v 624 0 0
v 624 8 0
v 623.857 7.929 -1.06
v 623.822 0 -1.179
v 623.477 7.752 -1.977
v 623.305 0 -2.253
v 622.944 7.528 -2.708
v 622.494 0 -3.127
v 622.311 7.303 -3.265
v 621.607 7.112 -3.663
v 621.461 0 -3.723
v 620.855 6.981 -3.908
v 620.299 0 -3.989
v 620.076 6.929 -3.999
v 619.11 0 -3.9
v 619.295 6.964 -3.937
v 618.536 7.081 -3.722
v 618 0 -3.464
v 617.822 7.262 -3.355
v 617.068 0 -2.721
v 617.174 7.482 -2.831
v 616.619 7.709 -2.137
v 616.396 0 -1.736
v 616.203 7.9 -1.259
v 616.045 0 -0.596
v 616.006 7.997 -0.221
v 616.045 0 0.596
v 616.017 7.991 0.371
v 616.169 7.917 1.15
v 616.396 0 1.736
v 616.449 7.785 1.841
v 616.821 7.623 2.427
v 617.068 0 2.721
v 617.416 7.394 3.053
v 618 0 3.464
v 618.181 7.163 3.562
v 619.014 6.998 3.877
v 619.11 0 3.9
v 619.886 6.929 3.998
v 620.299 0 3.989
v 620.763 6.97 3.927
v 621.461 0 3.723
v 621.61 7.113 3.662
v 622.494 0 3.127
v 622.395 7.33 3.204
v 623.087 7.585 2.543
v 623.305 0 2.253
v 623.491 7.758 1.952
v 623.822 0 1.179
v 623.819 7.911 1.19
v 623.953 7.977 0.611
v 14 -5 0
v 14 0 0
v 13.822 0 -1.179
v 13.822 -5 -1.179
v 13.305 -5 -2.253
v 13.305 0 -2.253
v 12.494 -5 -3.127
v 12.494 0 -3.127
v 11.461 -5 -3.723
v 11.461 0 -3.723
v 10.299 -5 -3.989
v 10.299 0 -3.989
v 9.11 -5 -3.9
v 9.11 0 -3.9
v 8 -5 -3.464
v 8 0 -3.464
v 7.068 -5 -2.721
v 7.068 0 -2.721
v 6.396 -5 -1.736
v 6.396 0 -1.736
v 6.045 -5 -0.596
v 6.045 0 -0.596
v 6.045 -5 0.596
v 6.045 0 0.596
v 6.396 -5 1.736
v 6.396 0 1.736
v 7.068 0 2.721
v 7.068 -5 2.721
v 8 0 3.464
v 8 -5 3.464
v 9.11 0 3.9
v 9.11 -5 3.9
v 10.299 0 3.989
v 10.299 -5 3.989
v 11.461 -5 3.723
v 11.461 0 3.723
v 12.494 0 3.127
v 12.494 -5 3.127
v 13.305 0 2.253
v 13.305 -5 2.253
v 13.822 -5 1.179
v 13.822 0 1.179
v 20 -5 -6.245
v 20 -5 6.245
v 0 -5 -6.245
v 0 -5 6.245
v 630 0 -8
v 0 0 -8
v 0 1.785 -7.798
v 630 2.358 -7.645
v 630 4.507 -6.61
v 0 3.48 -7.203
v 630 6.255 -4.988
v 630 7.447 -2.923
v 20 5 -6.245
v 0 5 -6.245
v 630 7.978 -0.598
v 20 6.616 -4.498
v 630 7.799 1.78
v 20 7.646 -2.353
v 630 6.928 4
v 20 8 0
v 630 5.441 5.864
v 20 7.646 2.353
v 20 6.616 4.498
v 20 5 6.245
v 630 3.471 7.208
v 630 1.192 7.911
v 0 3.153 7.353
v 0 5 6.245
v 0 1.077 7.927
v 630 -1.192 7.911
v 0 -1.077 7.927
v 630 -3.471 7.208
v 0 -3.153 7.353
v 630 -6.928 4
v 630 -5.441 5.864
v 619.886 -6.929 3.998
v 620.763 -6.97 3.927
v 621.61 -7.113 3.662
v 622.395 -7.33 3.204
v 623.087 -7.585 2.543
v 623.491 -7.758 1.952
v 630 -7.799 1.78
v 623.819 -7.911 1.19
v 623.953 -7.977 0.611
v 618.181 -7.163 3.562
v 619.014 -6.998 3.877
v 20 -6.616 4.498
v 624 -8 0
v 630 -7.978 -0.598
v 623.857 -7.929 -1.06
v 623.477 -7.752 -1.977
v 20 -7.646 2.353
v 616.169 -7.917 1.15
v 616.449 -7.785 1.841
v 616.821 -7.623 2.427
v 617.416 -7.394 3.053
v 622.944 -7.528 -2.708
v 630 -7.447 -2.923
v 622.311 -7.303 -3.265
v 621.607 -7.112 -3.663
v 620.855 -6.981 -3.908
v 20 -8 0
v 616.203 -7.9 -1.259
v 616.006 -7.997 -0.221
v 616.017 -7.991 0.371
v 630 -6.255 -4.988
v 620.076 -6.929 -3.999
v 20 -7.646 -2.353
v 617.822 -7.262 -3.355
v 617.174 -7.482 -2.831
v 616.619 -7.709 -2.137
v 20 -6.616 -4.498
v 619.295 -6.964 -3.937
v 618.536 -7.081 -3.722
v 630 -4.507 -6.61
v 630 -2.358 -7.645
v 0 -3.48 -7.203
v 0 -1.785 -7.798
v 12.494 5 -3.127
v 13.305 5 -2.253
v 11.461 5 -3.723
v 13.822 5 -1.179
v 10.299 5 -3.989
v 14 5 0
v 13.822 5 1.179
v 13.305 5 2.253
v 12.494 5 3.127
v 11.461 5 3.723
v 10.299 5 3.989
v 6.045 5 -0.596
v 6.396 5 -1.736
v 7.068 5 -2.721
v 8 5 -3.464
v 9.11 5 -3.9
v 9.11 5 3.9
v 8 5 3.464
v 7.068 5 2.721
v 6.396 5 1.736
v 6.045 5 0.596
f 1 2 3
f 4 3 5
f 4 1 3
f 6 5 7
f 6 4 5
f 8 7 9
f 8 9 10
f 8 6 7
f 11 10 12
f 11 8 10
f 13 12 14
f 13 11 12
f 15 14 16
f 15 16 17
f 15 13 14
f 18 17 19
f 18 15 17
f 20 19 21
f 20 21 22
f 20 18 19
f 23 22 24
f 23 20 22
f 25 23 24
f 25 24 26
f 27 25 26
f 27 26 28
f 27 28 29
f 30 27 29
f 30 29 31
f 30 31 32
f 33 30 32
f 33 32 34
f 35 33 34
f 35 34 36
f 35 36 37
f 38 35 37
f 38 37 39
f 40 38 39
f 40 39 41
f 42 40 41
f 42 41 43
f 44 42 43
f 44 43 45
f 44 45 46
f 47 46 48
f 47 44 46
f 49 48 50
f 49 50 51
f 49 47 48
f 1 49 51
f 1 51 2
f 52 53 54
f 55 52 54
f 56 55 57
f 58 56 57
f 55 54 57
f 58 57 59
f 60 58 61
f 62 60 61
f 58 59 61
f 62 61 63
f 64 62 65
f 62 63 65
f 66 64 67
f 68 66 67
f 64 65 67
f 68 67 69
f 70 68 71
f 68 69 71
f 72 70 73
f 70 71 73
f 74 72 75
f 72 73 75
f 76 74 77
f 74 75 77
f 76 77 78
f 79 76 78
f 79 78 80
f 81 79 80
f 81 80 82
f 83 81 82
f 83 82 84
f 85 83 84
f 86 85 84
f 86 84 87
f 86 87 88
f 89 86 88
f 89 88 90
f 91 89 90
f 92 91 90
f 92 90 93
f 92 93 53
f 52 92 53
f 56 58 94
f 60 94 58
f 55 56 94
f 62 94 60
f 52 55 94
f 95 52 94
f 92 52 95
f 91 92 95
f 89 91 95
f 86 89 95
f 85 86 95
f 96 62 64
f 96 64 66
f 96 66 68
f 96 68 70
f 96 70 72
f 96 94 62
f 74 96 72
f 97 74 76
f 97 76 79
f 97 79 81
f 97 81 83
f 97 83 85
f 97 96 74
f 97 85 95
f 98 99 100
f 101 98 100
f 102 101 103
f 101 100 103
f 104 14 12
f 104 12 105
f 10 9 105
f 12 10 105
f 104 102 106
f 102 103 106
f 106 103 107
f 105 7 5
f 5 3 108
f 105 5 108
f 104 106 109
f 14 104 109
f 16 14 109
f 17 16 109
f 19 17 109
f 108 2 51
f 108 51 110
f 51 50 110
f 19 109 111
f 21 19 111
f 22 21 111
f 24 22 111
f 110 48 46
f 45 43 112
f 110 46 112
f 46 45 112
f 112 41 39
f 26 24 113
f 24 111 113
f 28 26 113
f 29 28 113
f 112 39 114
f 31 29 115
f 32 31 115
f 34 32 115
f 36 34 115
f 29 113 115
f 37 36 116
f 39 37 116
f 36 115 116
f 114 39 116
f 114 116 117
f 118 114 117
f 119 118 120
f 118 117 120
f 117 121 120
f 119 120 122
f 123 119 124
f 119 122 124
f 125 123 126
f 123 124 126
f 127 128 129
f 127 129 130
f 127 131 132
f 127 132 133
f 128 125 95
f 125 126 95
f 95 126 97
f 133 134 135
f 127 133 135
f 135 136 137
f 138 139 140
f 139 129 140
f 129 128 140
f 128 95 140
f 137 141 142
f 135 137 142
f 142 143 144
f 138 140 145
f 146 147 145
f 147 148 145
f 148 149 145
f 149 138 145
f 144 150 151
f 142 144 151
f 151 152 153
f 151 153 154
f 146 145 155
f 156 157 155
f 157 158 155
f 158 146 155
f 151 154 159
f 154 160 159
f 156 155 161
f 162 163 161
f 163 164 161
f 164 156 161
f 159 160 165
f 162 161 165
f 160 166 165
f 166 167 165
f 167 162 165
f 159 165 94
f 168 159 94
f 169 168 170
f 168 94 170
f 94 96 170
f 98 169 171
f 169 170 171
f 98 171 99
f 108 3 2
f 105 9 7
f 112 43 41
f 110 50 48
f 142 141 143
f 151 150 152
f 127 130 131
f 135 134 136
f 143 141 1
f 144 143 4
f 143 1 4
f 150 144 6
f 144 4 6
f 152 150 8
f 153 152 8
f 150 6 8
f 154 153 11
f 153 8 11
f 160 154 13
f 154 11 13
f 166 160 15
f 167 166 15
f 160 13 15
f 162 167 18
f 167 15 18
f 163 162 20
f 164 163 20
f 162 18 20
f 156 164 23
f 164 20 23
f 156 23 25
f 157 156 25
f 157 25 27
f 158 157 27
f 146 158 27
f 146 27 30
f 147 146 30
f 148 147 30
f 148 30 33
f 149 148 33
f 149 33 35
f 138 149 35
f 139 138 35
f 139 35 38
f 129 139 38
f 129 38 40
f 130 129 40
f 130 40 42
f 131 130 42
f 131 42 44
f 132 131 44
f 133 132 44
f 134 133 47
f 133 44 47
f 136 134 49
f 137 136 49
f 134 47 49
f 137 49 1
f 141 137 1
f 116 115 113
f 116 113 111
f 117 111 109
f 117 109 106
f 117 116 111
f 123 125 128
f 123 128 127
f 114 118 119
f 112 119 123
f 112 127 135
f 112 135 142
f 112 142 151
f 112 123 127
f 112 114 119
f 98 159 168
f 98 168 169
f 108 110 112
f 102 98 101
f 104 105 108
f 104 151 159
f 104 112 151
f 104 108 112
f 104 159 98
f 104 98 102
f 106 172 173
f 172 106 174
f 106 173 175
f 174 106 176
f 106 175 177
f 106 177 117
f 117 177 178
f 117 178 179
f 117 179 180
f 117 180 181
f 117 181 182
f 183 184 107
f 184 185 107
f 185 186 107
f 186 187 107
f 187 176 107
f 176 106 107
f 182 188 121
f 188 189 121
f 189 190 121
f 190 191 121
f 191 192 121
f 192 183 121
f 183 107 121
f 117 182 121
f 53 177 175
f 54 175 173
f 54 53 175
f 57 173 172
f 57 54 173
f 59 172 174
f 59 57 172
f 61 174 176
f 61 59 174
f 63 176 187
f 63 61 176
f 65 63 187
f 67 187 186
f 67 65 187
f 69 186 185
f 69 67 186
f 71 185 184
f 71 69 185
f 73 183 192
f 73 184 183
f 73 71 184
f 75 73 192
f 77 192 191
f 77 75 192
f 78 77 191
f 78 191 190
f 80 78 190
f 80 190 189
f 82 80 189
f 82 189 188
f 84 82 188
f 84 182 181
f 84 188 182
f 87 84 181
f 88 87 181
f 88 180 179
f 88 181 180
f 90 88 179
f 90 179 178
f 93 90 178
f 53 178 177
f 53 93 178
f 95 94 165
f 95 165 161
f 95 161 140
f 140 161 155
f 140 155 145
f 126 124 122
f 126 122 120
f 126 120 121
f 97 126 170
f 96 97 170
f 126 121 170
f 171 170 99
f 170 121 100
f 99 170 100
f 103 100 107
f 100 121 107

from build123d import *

# Parameters (mm, degrees)
SKETCH_1_R               = 8
EXTRUDE_1_DEPTH          = 630
SKETCH_2_R               = 4
CUT_EXTRUDE_1_DEPTH      = 9
CUT_EXTRUDE_1_DEPTH_BACK = 9
SKETCH_3_OUTSIDE_W       = 144.082
SKETCH_3_OUTSIDE_H       = 144.082
SKETCH_3_OUTSIDE_W_2     = 20
SKETCH_3_OUTSIDE_H_2     = 10
CUT_EXTRUDE_2_DEPTH      = 20


with BuildPart() as part:
    # 草图1 → 凸台-拉伸1 (new body)
    with BuildSketch(Plane(origin=(0, 0, 0), x_dir=(0, 0, -1), z_dir=(1, 0, 0))):
        Circle(SKETCH_1_R)
    extrude(amount=EXTRUDE_1_DEPTH)

    # 草图2 → 切除-拉伸1 (cut, two sides)
    with BuildSketch(Plane(origin=(0, 0, 0), x_dir=(1, 0, 0), z_dir=(0, 1, 0))) as cut_extrude_1_sk:
        with Locations((10, 0)):
            Circle(SKETCH_2_R)
        with Locations((620, 0)):
            Circle(SKETCH_2_R)
    extrude(amount=CUT_EXTRUDE_1_DEPTH, mode=Mode.SUBTRACT)
    extrude(cut_extrude_1_sk.sketch, amount=-CUT_EXTRUDE_1_DEPTH_BACK, mode=Mode.SUBTRACT)

    # 草图3 outside → 切除-拉伸2 (cut)
    with BuildSketch(Plane.ZY):
        Rectangle(SKETCH_3_OUTSIDE_W, SKETCH_3_OUTSIDE_H)
        Rectangle(SKETCH_3_OUTSIDE_W_2, SKETCH_3_OUTSIDE_H_2, mode=Mode.SUBTRACT)
    extrude(amount=-CUT_EXTRUDE_2_DEPTH, mode=Mode.SUBTRACT)


solid = part.part
